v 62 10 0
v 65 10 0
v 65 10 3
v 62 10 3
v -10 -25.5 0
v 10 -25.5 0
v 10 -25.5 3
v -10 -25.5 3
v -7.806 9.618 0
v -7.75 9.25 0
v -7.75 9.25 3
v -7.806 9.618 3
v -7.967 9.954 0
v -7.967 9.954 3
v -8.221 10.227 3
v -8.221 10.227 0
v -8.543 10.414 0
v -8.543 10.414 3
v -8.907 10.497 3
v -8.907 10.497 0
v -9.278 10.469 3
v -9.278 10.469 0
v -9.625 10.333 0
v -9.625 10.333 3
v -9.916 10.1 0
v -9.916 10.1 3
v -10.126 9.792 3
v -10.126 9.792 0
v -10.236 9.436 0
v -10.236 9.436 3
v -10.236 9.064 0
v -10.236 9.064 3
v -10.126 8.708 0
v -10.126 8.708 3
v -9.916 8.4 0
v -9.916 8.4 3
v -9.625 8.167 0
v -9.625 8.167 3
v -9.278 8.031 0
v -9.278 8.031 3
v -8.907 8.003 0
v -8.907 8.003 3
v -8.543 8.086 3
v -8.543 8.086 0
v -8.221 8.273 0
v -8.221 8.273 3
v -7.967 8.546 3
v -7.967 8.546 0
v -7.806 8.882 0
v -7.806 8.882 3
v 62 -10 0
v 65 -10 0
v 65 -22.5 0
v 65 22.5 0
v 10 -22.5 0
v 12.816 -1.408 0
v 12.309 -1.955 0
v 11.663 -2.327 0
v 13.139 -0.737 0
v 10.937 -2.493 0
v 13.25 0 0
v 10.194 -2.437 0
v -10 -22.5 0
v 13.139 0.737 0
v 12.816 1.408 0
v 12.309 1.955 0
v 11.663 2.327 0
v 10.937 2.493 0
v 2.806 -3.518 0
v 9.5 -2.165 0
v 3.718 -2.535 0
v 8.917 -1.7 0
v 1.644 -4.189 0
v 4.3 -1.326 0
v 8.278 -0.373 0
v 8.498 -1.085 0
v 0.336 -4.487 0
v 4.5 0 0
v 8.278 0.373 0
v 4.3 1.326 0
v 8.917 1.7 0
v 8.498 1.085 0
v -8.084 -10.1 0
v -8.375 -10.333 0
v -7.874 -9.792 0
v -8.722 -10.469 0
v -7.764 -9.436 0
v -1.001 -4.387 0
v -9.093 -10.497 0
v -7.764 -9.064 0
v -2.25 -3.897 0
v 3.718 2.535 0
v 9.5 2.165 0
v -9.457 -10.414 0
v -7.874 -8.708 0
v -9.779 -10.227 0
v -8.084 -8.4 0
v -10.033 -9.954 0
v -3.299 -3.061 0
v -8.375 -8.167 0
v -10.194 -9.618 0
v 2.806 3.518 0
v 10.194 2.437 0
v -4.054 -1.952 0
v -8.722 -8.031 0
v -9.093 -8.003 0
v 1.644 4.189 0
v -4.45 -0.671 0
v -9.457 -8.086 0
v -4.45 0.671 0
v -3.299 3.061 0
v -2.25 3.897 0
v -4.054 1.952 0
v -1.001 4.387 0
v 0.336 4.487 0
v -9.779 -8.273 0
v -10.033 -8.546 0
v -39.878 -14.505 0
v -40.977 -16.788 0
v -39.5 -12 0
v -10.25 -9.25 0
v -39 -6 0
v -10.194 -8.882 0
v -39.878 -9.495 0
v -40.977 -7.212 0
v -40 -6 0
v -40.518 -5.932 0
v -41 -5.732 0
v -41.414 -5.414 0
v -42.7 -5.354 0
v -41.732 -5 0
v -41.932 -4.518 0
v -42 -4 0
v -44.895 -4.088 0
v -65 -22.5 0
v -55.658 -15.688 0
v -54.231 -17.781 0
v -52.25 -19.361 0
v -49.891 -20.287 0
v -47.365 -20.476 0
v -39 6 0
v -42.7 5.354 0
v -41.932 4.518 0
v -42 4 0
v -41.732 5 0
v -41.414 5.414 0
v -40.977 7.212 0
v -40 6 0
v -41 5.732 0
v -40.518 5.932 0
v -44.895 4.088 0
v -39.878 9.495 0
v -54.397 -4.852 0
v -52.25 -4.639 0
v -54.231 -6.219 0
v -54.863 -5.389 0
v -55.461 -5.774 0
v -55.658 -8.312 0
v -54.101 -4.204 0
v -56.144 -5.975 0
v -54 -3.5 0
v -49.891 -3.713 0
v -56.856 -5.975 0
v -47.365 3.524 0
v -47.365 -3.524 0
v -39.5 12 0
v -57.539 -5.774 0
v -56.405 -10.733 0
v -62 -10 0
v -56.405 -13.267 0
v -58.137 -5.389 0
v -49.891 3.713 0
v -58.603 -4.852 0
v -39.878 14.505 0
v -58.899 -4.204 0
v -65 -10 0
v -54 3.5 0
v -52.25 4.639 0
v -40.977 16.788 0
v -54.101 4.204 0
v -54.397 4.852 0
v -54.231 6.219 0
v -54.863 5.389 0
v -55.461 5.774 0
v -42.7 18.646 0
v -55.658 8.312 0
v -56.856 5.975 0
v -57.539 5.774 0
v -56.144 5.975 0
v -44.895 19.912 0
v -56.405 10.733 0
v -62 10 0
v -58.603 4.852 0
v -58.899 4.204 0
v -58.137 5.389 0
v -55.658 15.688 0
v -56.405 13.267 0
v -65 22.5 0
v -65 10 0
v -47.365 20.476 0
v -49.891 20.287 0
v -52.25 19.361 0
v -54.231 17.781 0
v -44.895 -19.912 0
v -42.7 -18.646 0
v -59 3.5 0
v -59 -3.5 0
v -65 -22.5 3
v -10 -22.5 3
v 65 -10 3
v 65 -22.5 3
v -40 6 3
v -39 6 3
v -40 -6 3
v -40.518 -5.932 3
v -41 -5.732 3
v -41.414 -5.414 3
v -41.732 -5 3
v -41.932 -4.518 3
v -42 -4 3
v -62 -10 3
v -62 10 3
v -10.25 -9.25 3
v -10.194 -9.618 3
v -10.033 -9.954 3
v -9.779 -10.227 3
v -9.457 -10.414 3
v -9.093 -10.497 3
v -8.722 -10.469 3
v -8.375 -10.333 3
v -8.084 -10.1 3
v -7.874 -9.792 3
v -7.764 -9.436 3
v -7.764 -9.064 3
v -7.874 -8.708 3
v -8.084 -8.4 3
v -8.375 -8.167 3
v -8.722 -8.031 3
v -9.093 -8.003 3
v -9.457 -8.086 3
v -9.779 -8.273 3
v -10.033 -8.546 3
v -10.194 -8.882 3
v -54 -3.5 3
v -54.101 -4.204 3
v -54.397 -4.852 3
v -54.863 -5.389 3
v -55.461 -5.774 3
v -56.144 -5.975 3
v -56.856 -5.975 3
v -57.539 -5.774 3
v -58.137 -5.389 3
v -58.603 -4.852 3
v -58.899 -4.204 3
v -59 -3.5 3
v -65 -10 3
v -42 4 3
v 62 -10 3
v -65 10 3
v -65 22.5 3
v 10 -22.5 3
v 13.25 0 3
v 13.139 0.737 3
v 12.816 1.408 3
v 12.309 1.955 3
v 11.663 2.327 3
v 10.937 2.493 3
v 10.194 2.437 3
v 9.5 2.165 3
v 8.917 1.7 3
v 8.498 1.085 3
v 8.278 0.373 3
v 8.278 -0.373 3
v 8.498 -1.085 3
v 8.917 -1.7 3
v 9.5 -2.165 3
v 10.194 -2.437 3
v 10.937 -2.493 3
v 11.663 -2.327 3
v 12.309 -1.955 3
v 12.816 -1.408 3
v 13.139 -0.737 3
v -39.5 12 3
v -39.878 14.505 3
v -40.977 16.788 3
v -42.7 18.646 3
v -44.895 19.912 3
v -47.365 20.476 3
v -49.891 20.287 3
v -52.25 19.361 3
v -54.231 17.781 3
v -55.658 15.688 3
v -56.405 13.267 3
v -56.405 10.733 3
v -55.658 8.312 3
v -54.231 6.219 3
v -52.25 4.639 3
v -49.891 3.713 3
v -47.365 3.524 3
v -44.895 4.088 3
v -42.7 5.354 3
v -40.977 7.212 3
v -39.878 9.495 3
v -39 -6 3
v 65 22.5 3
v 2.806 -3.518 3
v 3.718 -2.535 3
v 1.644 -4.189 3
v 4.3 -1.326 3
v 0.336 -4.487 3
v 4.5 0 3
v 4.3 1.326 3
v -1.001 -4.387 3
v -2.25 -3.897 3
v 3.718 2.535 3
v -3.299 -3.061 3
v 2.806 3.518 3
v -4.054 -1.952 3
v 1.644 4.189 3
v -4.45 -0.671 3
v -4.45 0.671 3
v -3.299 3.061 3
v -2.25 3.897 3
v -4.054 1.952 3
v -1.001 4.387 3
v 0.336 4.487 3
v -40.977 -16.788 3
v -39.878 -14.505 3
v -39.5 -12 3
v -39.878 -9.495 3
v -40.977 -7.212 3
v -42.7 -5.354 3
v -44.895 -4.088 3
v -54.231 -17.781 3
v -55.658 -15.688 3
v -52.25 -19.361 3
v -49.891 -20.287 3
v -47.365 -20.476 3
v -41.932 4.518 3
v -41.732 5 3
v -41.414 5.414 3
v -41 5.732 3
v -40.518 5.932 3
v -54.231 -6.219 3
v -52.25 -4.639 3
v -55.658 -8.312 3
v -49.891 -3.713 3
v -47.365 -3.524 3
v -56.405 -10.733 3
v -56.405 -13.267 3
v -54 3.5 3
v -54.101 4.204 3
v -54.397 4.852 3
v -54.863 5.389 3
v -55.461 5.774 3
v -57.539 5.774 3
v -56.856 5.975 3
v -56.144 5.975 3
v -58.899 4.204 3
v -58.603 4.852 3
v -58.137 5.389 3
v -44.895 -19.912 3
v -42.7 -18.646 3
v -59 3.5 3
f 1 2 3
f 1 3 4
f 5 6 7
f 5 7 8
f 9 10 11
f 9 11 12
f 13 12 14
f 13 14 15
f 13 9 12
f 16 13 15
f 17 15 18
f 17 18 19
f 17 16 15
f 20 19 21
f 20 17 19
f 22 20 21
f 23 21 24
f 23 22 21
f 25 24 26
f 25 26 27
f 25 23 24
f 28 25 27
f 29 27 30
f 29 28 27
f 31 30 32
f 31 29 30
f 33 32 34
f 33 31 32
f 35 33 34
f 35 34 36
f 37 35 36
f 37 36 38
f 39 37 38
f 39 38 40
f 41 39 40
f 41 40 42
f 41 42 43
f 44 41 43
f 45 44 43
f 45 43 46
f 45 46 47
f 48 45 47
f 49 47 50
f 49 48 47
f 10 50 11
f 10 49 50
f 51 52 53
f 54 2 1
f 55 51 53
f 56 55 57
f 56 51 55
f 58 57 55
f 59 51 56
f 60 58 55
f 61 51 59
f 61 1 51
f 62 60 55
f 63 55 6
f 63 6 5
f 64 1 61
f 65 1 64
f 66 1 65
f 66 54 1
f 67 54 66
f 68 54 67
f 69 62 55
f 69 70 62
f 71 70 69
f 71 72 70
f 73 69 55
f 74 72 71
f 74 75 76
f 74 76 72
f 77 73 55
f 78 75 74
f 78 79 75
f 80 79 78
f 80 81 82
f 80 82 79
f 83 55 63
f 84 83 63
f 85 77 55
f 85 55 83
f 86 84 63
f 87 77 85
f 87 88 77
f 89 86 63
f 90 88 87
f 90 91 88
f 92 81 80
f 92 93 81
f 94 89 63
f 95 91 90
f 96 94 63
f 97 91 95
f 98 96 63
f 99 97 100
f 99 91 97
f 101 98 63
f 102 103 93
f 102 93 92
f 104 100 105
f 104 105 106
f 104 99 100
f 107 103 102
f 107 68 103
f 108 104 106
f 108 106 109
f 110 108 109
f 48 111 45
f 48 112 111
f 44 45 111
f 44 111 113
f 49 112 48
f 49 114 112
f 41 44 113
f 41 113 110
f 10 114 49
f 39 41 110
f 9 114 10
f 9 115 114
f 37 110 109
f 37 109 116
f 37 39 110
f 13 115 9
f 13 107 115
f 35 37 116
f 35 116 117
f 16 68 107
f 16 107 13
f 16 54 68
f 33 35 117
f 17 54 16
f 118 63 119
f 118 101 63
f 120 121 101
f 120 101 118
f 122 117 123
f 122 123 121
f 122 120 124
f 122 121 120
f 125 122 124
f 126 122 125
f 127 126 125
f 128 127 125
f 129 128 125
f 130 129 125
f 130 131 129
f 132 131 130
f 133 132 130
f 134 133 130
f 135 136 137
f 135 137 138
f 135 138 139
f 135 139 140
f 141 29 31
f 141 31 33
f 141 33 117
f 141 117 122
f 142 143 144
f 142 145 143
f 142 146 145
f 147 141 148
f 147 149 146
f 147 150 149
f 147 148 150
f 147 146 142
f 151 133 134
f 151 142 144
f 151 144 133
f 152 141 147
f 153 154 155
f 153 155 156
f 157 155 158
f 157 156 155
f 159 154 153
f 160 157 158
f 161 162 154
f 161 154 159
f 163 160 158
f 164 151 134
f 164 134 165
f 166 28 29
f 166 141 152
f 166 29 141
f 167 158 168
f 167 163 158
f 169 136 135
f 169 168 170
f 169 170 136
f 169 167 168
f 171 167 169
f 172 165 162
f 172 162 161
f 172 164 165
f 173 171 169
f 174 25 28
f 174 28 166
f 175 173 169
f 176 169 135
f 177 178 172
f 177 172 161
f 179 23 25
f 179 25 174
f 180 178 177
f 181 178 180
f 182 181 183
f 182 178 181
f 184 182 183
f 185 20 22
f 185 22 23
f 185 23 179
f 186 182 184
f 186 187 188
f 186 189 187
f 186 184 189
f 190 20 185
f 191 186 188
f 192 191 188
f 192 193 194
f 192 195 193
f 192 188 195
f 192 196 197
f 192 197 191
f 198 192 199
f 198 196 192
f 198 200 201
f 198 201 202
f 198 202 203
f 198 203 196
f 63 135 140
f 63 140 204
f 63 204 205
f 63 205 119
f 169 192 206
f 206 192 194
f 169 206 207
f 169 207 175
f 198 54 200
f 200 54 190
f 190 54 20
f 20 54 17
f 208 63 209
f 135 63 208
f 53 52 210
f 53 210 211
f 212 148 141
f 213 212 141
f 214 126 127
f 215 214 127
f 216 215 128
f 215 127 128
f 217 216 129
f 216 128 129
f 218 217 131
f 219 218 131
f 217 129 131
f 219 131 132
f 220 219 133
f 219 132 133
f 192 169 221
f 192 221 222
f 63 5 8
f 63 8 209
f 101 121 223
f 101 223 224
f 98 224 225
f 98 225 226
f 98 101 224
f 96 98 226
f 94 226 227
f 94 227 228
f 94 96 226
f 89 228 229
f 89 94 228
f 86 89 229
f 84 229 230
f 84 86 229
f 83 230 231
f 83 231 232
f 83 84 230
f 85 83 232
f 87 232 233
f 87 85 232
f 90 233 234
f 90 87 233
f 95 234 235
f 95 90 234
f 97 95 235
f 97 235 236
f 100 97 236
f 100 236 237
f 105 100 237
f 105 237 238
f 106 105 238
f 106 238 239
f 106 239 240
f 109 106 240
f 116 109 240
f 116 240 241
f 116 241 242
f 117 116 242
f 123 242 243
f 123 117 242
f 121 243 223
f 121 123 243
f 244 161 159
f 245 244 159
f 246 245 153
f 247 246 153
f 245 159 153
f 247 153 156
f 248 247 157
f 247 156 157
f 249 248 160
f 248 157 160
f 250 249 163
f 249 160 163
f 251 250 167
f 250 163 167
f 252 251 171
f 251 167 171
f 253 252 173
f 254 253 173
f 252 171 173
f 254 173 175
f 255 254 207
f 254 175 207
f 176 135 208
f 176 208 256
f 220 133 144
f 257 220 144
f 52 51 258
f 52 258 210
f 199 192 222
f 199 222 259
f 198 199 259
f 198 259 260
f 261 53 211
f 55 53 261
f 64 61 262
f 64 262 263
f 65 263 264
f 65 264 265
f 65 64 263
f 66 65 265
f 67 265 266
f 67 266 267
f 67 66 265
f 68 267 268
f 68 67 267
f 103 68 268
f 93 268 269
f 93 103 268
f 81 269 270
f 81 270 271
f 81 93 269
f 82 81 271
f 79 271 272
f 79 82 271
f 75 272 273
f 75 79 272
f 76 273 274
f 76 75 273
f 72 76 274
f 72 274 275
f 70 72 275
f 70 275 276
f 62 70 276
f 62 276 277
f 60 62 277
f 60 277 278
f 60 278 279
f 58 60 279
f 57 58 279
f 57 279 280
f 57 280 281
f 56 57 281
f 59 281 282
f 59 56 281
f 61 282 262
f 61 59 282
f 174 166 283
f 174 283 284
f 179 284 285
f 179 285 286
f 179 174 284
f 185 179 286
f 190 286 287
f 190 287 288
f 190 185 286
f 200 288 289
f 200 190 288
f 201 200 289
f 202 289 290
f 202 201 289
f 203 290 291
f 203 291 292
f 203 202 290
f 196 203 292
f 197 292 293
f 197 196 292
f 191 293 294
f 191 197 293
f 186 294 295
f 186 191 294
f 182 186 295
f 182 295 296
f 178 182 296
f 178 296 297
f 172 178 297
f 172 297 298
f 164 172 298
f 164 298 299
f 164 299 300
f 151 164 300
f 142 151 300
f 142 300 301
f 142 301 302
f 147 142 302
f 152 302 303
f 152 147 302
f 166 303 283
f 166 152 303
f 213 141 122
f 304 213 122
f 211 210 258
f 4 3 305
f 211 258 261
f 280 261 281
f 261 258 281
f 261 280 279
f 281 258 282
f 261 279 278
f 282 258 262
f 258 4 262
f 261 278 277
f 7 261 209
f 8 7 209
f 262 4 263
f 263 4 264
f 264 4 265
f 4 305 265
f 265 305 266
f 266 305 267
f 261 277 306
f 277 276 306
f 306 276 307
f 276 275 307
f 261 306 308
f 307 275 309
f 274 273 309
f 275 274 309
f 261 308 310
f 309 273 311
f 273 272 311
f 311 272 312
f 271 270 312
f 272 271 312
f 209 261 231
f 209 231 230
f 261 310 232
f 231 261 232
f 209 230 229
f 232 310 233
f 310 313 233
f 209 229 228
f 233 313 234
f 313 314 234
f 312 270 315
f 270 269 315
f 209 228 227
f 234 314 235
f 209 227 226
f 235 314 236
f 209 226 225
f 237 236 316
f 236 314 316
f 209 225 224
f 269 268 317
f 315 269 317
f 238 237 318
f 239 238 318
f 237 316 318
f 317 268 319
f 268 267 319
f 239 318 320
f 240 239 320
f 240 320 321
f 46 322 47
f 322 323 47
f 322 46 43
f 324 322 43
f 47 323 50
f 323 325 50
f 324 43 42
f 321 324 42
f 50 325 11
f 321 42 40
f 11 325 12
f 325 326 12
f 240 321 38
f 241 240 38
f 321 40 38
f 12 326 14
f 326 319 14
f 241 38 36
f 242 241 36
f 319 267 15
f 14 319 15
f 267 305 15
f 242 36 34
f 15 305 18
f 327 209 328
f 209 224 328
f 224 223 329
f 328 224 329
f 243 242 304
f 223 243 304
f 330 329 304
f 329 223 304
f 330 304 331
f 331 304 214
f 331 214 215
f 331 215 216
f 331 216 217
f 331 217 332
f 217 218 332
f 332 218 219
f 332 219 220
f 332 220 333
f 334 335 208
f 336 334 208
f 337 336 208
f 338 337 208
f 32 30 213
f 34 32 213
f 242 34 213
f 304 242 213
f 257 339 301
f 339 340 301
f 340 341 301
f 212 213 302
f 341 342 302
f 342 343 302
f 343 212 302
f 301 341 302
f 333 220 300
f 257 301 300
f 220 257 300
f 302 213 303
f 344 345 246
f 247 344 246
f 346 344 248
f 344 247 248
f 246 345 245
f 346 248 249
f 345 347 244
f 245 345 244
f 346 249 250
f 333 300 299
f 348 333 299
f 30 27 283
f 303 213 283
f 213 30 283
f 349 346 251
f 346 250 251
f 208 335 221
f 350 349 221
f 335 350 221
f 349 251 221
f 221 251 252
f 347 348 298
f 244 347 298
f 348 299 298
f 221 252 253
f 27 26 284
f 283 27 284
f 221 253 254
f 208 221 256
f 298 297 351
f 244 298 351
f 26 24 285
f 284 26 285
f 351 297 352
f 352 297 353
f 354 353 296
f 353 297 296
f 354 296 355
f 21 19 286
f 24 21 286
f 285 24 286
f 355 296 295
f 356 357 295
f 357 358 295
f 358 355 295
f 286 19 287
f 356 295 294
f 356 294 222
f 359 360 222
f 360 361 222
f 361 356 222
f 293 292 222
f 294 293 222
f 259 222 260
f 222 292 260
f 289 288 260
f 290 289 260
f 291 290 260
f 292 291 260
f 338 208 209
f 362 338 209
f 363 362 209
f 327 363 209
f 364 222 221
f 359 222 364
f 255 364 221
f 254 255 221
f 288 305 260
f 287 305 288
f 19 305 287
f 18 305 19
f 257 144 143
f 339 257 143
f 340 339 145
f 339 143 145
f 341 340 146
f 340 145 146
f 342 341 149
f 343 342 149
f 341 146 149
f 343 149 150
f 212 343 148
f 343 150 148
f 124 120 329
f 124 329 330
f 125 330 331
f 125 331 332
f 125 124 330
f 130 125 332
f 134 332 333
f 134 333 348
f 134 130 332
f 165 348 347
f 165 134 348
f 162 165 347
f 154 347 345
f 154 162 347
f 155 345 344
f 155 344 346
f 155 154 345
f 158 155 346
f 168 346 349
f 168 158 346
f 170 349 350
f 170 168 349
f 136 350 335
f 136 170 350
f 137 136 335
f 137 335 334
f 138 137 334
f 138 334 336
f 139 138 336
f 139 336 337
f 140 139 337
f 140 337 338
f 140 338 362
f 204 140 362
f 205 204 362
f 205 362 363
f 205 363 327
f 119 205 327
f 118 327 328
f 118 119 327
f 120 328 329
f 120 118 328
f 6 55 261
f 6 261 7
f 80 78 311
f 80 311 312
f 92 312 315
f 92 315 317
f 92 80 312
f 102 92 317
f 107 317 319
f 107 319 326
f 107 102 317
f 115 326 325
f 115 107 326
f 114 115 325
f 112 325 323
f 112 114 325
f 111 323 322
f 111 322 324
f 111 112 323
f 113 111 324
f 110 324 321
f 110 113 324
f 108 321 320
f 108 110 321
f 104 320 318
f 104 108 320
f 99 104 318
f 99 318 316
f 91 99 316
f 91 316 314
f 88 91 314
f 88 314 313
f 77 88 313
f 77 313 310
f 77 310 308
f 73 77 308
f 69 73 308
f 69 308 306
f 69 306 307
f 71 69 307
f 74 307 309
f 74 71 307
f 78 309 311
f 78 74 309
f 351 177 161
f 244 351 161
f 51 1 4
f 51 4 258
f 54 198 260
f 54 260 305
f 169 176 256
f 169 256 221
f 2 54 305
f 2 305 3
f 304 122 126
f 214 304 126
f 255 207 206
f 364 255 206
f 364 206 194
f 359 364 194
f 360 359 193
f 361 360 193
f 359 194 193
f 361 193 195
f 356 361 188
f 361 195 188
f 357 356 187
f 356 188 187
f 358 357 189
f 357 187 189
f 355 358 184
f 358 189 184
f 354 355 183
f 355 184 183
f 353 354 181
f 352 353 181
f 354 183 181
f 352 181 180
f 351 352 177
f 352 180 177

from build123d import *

# Parameters (mm, degrees)
SKETCH1_R           = 8.5
SKETCH1_R_2         = 4.5
SKETCH1_R_3         = 2.5
SKETCH1_R_4         = 1.25
BOSS_EXTRUDE1_DEPTH = 3


with BuildPart() as part:
    # Sketch1 → Boss-Extrude1 (new body)
    with BuildSketch(Plane.XY):
        Polygon((-10, -22.5), (-65, -22.5), (-65, -10), (-62, -10), (-62, 10), (-65, 10), (-65, 22.5), (65, 22.5), (65, 10), (62, 10), (62, -10), (65, -10), (65, -22.5), (10, -22.5), (10, -25.5), (-10, -25.5), align=None)
        with Locations((-48, 12)):
            Circle(SKETCH1_R, mode=Mode.SUBTRACT)
        with Locations((-48, -12)):
            Circle(SKETCH1_R, mode=Mode.SUBTRACT)
        Circle(SKETCH1_R_2, mode=Mode.SUBTRACT)
        with Locations((10.75, 0)):
            Circle(SKETCH1_R_3, mode=Mode.SUBTRACT)
        with Locations((-9, 9.25)):
            Circle(SKETCH1_R_4, mode=Mode.SUBTRACT)
        with Locations(Location((-9, -9.25, 0), (0, 0, 180))):
            Circle(SKETCH1_R_4, mode=Mode.SUBTRACT)
        with BuildLine():
            Line((-54, 3.5), (-54, -3.5))
            ThreePointArc((-54, -3.5), (-56.5, -6), (-59, -3.5))
            Line((-59, -3.5), (-59, 3.5))
            ThreePointArc((-59, 3.5), (-56.5, 6), (-54, 3.5))
        make_face(mode=Mode.SUBTRACT)
        with BuildLine():
            Line((-39, -6), (-40, -6))
            ThreePointArc((-40, -6), (-41.414213562, -5.414213562), (-42, -4))
            Line((-42, -4), (-42, 4))
            ThreePointArc((-42, 4), (-41.414213562, 5.414213562), (-40, 6))
            Line((-40, 6), (-39, 6))
            Line((-39, 6), (-39, -6))
        make_face(mode=Mode.SUBTRACT)
    extrude(amount=BOSS_EXTRUDE1_DEPTH)


solid = part.part
